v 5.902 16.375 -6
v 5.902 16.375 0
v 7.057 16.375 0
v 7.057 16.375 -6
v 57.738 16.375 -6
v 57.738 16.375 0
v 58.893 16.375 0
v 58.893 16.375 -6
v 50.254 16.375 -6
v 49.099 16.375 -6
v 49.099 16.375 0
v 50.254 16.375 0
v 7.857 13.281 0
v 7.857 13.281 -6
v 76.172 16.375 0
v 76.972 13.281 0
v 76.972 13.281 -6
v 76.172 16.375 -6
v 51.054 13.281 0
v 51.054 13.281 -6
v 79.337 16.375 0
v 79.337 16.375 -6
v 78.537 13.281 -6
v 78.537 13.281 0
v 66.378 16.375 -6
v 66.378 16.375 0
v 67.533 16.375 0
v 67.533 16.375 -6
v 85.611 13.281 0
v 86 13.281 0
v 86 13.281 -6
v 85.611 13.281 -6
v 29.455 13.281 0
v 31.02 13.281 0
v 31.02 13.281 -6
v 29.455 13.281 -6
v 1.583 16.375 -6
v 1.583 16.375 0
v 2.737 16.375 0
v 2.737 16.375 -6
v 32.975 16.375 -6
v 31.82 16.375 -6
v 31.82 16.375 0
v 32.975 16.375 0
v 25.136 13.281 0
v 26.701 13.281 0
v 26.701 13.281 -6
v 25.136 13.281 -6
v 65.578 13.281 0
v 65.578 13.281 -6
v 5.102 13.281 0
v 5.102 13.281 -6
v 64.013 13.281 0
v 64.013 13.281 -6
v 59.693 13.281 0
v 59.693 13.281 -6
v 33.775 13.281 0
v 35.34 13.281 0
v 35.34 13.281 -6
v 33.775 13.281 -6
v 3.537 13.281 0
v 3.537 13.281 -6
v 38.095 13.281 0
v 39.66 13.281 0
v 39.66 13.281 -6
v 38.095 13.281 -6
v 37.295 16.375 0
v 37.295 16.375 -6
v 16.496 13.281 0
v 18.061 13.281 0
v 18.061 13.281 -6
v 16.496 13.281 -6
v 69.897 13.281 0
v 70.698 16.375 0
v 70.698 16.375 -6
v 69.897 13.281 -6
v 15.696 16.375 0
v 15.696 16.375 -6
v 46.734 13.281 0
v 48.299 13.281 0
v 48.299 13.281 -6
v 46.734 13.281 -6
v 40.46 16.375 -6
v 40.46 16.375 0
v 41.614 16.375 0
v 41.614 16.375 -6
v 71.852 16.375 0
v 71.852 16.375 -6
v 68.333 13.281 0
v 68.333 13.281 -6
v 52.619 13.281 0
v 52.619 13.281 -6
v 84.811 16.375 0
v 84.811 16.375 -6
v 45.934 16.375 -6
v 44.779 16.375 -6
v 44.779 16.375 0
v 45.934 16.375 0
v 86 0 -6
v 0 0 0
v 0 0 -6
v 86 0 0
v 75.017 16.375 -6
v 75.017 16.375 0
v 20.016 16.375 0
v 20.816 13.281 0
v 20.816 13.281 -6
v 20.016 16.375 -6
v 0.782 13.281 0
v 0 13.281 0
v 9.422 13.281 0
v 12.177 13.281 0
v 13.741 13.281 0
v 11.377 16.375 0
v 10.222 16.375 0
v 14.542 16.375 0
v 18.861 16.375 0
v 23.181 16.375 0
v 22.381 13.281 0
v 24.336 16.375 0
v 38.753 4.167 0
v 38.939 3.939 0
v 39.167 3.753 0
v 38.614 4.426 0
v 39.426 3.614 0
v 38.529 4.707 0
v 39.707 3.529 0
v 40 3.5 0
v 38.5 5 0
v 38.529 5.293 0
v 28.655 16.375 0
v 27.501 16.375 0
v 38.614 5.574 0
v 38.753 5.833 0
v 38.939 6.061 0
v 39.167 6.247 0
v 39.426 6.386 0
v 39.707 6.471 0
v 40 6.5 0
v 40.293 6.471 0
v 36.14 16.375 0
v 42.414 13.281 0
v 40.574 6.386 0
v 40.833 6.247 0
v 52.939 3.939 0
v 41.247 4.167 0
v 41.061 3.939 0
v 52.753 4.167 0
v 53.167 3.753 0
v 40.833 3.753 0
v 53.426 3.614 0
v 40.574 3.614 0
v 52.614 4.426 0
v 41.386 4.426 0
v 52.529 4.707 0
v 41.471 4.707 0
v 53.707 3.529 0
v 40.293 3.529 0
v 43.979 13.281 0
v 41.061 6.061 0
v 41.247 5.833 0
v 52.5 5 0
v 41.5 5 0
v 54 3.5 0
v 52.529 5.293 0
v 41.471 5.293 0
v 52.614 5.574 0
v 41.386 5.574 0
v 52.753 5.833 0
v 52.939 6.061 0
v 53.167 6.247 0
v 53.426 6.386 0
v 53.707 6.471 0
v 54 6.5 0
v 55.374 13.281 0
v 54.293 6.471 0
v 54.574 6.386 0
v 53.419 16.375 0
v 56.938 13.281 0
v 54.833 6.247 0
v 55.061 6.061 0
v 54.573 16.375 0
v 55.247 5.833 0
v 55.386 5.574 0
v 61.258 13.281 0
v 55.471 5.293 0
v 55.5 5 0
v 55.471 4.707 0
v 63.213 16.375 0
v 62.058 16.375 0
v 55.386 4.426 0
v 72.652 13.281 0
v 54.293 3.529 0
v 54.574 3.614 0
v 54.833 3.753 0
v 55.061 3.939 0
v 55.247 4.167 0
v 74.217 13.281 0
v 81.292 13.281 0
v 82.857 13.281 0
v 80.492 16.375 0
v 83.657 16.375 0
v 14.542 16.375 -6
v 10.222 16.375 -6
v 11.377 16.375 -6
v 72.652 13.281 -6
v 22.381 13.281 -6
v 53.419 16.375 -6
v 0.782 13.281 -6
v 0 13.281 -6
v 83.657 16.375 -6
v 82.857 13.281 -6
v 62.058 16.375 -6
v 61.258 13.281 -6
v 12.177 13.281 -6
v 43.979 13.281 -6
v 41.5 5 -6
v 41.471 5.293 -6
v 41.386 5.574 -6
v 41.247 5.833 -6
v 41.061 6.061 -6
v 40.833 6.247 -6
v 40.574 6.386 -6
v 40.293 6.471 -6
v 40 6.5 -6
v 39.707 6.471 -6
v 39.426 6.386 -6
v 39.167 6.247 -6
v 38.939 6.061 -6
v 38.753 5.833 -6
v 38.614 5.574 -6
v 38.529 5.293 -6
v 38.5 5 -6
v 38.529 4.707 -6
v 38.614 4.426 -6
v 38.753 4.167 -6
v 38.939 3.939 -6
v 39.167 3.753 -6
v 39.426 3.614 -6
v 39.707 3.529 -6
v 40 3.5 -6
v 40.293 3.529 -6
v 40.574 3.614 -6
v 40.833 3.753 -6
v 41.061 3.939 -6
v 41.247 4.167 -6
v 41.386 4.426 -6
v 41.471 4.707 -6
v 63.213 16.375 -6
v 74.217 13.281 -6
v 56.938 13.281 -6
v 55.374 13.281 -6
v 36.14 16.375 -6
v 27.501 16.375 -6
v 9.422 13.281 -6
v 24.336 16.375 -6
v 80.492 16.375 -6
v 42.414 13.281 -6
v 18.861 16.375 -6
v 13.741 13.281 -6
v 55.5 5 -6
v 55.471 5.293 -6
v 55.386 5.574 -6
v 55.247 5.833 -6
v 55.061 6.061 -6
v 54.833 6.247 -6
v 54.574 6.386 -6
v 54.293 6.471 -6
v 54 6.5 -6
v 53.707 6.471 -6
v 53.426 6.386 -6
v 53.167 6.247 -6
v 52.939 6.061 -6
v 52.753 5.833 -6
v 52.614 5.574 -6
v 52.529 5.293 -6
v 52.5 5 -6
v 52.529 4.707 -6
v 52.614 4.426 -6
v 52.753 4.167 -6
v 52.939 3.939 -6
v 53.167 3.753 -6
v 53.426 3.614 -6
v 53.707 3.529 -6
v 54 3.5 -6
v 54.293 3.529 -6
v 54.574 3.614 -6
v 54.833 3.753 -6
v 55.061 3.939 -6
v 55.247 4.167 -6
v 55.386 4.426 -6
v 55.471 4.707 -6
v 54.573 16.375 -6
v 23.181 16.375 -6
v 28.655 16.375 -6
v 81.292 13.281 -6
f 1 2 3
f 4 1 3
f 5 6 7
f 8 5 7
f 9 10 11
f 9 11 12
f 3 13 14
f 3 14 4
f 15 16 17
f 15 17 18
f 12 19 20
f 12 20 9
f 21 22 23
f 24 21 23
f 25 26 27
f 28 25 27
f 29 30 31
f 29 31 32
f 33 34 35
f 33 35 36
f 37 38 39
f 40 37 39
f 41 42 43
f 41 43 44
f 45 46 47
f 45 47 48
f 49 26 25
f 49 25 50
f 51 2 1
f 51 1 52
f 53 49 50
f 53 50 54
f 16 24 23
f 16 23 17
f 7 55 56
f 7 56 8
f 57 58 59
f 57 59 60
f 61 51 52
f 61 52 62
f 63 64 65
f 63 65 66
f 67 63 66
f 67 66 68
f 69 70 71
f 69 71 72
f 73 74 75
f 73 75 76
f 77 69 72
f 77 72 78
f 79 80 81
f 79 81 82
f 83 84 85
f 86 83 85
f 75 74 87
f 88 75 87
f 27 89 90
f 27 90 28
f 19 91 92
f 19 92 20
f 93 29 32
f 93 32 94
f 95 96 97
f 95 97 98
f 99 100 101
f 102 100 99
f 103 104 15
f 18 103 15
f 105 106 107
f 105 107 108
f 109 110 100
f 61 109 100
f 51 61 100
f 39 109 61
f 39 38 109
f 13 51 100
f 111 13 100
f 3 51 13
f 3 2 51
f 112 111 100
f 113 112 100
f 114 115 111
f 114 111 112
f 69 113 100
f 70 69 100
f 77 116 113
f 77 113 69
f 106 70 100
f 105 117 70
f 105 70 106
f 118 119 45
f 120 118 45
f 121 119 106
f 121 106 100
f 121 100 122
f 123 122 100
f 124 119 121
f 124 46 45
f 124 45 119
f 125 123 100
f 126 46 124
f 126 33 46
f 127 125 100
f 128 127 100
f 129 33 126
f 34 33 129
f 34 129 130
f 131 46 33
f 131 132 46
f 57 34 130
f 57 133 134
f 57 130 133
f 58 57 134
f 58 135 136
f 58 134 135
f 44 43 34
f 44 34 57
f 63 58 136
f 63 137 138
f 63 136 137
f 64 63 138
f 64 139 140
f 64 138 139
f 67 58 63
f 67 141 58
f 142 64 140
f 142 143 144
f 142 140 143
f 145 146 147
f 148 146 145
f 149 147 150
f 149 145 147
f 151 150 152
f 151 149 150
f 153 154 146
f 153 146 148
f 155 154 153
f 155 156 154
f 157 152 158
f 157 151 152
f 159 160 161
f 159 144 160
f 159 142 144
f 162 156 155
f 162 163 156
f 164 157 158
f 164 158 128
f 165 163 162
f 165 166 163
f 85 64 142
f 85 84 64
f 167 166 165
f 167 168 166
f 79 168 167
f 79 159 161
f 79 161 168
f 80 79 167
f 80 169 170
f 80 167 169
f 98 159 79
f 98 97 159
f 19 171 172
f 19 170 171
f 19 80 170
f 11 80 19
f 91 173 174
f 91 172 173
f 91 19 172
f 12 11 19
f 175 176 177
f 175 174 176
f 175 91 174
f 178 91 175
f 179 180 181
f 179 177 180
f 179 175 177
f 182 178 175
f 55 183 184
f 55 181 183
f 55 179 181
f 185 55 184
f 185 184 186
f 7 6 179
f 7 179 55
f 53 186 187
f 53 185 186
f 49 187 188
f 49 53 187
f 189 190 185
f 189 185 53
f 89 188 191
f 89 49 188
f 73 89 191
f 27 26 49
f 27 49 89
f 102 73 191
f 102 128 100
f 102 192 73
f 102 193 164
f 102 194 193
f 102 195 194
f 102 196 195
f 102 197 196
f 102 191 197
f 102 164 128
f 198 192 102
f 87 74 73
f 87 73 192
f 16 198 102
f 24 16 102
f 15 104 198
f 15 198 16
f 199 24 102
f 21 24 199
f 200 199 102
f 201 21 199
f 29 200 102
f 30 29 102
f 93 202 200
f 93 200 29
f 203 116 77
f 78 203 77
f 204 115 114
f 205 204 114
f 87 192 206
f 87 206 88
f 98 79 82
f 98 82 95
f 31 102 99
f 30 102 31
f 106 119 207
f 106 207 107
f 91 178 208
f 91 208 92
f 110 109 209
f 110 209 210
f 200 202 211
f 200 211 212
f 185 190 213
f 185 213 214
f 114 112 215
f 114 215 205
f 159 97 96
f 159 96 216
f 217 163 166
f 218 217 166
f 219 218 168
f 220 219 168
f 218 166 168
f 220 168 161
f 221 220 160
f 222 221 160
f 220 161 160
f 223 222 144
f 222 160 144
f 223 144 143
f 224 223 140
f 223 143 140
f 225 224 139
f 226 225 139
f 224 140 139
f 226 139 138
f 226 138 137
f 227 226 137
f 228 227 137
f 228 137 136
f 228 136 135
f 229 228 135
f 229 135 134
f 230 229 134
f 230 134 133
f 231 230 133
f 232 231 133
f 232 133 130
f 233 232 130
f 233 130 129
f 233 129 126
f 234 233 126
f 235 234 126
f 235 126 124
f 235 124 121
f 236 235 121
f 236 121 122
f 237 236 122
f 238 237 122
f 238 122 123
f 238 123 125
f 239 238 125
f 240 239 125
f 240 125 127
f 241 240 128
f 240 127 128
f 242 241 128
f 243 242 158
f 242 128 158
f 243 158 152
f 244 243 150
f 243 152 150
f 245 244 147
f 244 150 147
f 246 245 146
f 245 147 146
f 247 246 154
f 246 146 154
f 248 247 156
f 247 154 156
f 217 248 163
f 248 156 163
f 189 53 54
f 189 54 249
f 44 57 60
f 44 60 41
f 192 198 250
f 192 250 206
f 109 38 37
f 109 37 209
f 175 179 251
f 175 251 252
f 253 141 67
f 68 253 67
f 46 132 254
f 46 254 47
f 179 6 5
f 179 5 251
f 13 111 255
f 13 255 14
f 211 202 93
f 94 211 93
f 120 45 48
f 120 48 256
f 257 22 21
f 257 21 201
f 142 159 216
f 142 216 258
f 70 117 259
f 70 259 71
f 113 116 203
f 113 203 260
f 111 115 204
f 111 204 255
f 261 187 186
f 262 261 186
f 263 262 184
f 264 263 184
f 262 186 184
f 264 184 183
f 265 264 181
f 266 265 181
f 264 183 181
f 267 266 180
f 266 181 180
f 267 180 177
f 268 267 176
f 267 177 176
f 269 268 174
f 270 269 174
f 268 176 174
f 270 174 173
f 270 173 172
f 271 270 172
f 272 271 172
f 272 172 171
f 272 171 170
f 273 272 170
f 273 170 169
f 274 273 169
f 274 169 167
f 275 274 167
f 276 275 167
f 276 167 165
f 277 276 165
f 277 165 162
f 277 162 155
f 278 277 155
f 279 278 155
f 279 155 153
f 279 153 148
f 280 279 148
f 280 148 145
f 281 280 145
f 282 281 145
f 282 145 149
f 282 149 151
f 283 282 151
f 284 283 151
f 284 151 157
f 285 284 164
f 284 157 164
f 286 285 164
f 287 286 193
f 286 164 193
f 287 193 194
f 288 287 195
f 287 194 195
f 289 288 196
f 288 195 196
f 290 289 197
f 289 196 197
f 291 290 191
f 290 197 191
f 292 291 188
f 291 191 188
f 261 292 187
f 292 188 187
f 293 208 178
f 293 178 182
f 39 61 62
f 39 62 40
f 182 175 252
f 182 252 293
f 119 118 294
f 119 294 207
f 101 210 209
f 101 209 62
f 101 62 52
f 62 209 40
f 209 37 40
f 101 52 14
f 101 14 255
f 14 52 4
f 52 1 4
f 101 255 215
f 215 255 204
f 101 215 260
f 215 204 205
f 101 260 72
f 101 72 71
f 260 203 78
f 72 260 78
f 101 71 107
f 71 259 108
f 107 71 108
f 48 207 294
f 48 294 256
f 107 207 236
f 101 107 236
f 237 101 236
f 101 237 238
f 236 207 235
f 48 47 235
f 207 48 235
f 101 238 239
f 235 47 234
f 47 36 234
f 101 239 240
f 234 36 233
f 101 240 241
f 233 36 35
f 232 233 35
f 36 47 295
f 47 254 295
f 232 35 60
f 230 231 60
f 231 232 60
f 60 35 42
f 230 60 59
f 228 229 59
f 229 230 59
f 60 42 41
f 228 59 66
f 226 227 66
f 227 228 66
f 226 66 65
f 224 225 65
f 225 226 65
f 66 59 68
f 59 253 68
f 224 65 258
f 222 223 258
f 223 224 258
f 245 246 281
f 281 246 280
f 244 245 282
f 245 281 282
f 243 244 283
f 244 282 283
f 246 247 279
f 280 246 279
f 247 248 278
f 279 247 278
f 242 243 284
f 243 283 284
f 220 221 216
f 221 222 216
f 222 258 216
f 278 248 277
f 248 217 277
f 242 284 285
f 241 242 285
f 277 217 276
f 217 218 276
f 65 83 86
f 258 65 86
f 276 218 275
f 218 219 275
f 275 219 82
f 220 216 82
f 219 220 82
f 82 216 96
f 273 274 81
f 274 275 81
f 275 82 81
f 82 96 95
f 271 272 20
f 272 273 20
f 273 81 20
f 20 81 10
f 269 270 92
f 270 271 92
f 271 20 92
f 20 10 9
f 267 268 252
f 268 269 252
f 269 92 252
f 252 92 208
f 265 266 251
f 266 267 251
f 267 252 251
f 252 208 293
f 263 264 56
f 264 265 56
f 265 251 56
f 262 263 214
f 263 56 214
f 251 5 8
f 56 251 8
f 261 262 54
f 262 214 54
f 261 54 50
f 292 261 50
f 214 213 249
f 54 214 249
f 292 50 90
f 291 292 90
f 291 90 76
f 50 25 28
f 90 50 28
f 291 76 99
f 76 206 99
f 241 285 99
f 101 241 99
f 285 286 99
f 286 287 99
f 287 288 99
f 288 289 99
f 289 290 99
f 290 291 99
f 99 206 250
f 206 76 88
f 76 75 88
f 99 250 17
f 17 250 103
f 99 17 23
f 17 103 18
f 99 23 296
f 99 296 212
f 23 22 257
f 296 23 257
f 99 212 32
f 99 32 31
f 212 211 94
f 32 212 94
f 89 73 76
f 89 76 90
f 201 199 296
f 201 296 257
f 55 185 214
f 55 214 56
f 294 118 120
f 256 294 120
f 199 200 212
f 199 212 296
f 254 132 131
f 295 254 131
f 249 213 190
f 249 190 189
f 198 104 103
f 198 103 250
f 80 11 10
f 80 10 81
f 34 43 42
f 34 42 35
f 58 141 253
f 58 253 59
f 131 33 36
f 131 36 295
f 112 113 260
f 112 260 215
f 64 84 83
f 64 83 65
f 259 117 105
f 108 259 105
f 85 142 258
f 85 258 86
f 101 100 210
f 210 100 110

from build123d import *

# Parameters (mm, degrees)
BLANKSKE_W              = 86
BLANKSKE_H              = 16.375
BLANK_DEPTH             = 6
TOOTHCUTSIM_DEPTH       = 88.750445156
TEETHCUTS_COUNT         = 21
TEETHCUTS_PITCH         = 4.319689894
ESQUISSE1_R             = 1.5
ENL_V_MAT_EXTRU_1_DEPTH = 88.750445156


with BuildPart() as part:
    # BlankSke → Blank (new body)
    with BuildSketch(Plane.XY):
        with Locations((43, 8.1875)):
            Rectangle(BLANKSKE_W, BLANKSKE_H)
    extrude(amount=-BLANK_DEPTH)

    # TooCutSkeSim → ToothCutSim (cut, through all)
    with BuildSketch(Plane.XY):
        Polygon((0.7824235, 13.28125), (-0.7824235, 13.28125), (-1.589090539, 16.4004), (1.589090539, 16.4004), align=None)
    toothcutsim = extrude(amount=-TOOTHCUTSIM_DEPTH, mode=Mode.SUBTRACT)

    # TeethCuts: ToothCutSim ×21
    with Locations(*[(i * TEETHCUTS_PITCH, 0, 0) for i in range(1, TEETHCUTS_COUNT)]):
        add(toothcutsim, mode=Mode.SUBTRACT)

    # Esquisse1 → Enlèv. mat.-Extru.1 (cut, through all)
    with BuildSketch(Plane.XY):
        with Locations((40, 5)):
            Circle(ESQUISSE1_R)
        with Locations((54, 5)):
            Circle(ESQUISSE1_R)
    extrude(amount=-ENL_V_MAT_EXTRU_1_DEPTH, mode=Mode.SUBTRACT)


solid = part.part
